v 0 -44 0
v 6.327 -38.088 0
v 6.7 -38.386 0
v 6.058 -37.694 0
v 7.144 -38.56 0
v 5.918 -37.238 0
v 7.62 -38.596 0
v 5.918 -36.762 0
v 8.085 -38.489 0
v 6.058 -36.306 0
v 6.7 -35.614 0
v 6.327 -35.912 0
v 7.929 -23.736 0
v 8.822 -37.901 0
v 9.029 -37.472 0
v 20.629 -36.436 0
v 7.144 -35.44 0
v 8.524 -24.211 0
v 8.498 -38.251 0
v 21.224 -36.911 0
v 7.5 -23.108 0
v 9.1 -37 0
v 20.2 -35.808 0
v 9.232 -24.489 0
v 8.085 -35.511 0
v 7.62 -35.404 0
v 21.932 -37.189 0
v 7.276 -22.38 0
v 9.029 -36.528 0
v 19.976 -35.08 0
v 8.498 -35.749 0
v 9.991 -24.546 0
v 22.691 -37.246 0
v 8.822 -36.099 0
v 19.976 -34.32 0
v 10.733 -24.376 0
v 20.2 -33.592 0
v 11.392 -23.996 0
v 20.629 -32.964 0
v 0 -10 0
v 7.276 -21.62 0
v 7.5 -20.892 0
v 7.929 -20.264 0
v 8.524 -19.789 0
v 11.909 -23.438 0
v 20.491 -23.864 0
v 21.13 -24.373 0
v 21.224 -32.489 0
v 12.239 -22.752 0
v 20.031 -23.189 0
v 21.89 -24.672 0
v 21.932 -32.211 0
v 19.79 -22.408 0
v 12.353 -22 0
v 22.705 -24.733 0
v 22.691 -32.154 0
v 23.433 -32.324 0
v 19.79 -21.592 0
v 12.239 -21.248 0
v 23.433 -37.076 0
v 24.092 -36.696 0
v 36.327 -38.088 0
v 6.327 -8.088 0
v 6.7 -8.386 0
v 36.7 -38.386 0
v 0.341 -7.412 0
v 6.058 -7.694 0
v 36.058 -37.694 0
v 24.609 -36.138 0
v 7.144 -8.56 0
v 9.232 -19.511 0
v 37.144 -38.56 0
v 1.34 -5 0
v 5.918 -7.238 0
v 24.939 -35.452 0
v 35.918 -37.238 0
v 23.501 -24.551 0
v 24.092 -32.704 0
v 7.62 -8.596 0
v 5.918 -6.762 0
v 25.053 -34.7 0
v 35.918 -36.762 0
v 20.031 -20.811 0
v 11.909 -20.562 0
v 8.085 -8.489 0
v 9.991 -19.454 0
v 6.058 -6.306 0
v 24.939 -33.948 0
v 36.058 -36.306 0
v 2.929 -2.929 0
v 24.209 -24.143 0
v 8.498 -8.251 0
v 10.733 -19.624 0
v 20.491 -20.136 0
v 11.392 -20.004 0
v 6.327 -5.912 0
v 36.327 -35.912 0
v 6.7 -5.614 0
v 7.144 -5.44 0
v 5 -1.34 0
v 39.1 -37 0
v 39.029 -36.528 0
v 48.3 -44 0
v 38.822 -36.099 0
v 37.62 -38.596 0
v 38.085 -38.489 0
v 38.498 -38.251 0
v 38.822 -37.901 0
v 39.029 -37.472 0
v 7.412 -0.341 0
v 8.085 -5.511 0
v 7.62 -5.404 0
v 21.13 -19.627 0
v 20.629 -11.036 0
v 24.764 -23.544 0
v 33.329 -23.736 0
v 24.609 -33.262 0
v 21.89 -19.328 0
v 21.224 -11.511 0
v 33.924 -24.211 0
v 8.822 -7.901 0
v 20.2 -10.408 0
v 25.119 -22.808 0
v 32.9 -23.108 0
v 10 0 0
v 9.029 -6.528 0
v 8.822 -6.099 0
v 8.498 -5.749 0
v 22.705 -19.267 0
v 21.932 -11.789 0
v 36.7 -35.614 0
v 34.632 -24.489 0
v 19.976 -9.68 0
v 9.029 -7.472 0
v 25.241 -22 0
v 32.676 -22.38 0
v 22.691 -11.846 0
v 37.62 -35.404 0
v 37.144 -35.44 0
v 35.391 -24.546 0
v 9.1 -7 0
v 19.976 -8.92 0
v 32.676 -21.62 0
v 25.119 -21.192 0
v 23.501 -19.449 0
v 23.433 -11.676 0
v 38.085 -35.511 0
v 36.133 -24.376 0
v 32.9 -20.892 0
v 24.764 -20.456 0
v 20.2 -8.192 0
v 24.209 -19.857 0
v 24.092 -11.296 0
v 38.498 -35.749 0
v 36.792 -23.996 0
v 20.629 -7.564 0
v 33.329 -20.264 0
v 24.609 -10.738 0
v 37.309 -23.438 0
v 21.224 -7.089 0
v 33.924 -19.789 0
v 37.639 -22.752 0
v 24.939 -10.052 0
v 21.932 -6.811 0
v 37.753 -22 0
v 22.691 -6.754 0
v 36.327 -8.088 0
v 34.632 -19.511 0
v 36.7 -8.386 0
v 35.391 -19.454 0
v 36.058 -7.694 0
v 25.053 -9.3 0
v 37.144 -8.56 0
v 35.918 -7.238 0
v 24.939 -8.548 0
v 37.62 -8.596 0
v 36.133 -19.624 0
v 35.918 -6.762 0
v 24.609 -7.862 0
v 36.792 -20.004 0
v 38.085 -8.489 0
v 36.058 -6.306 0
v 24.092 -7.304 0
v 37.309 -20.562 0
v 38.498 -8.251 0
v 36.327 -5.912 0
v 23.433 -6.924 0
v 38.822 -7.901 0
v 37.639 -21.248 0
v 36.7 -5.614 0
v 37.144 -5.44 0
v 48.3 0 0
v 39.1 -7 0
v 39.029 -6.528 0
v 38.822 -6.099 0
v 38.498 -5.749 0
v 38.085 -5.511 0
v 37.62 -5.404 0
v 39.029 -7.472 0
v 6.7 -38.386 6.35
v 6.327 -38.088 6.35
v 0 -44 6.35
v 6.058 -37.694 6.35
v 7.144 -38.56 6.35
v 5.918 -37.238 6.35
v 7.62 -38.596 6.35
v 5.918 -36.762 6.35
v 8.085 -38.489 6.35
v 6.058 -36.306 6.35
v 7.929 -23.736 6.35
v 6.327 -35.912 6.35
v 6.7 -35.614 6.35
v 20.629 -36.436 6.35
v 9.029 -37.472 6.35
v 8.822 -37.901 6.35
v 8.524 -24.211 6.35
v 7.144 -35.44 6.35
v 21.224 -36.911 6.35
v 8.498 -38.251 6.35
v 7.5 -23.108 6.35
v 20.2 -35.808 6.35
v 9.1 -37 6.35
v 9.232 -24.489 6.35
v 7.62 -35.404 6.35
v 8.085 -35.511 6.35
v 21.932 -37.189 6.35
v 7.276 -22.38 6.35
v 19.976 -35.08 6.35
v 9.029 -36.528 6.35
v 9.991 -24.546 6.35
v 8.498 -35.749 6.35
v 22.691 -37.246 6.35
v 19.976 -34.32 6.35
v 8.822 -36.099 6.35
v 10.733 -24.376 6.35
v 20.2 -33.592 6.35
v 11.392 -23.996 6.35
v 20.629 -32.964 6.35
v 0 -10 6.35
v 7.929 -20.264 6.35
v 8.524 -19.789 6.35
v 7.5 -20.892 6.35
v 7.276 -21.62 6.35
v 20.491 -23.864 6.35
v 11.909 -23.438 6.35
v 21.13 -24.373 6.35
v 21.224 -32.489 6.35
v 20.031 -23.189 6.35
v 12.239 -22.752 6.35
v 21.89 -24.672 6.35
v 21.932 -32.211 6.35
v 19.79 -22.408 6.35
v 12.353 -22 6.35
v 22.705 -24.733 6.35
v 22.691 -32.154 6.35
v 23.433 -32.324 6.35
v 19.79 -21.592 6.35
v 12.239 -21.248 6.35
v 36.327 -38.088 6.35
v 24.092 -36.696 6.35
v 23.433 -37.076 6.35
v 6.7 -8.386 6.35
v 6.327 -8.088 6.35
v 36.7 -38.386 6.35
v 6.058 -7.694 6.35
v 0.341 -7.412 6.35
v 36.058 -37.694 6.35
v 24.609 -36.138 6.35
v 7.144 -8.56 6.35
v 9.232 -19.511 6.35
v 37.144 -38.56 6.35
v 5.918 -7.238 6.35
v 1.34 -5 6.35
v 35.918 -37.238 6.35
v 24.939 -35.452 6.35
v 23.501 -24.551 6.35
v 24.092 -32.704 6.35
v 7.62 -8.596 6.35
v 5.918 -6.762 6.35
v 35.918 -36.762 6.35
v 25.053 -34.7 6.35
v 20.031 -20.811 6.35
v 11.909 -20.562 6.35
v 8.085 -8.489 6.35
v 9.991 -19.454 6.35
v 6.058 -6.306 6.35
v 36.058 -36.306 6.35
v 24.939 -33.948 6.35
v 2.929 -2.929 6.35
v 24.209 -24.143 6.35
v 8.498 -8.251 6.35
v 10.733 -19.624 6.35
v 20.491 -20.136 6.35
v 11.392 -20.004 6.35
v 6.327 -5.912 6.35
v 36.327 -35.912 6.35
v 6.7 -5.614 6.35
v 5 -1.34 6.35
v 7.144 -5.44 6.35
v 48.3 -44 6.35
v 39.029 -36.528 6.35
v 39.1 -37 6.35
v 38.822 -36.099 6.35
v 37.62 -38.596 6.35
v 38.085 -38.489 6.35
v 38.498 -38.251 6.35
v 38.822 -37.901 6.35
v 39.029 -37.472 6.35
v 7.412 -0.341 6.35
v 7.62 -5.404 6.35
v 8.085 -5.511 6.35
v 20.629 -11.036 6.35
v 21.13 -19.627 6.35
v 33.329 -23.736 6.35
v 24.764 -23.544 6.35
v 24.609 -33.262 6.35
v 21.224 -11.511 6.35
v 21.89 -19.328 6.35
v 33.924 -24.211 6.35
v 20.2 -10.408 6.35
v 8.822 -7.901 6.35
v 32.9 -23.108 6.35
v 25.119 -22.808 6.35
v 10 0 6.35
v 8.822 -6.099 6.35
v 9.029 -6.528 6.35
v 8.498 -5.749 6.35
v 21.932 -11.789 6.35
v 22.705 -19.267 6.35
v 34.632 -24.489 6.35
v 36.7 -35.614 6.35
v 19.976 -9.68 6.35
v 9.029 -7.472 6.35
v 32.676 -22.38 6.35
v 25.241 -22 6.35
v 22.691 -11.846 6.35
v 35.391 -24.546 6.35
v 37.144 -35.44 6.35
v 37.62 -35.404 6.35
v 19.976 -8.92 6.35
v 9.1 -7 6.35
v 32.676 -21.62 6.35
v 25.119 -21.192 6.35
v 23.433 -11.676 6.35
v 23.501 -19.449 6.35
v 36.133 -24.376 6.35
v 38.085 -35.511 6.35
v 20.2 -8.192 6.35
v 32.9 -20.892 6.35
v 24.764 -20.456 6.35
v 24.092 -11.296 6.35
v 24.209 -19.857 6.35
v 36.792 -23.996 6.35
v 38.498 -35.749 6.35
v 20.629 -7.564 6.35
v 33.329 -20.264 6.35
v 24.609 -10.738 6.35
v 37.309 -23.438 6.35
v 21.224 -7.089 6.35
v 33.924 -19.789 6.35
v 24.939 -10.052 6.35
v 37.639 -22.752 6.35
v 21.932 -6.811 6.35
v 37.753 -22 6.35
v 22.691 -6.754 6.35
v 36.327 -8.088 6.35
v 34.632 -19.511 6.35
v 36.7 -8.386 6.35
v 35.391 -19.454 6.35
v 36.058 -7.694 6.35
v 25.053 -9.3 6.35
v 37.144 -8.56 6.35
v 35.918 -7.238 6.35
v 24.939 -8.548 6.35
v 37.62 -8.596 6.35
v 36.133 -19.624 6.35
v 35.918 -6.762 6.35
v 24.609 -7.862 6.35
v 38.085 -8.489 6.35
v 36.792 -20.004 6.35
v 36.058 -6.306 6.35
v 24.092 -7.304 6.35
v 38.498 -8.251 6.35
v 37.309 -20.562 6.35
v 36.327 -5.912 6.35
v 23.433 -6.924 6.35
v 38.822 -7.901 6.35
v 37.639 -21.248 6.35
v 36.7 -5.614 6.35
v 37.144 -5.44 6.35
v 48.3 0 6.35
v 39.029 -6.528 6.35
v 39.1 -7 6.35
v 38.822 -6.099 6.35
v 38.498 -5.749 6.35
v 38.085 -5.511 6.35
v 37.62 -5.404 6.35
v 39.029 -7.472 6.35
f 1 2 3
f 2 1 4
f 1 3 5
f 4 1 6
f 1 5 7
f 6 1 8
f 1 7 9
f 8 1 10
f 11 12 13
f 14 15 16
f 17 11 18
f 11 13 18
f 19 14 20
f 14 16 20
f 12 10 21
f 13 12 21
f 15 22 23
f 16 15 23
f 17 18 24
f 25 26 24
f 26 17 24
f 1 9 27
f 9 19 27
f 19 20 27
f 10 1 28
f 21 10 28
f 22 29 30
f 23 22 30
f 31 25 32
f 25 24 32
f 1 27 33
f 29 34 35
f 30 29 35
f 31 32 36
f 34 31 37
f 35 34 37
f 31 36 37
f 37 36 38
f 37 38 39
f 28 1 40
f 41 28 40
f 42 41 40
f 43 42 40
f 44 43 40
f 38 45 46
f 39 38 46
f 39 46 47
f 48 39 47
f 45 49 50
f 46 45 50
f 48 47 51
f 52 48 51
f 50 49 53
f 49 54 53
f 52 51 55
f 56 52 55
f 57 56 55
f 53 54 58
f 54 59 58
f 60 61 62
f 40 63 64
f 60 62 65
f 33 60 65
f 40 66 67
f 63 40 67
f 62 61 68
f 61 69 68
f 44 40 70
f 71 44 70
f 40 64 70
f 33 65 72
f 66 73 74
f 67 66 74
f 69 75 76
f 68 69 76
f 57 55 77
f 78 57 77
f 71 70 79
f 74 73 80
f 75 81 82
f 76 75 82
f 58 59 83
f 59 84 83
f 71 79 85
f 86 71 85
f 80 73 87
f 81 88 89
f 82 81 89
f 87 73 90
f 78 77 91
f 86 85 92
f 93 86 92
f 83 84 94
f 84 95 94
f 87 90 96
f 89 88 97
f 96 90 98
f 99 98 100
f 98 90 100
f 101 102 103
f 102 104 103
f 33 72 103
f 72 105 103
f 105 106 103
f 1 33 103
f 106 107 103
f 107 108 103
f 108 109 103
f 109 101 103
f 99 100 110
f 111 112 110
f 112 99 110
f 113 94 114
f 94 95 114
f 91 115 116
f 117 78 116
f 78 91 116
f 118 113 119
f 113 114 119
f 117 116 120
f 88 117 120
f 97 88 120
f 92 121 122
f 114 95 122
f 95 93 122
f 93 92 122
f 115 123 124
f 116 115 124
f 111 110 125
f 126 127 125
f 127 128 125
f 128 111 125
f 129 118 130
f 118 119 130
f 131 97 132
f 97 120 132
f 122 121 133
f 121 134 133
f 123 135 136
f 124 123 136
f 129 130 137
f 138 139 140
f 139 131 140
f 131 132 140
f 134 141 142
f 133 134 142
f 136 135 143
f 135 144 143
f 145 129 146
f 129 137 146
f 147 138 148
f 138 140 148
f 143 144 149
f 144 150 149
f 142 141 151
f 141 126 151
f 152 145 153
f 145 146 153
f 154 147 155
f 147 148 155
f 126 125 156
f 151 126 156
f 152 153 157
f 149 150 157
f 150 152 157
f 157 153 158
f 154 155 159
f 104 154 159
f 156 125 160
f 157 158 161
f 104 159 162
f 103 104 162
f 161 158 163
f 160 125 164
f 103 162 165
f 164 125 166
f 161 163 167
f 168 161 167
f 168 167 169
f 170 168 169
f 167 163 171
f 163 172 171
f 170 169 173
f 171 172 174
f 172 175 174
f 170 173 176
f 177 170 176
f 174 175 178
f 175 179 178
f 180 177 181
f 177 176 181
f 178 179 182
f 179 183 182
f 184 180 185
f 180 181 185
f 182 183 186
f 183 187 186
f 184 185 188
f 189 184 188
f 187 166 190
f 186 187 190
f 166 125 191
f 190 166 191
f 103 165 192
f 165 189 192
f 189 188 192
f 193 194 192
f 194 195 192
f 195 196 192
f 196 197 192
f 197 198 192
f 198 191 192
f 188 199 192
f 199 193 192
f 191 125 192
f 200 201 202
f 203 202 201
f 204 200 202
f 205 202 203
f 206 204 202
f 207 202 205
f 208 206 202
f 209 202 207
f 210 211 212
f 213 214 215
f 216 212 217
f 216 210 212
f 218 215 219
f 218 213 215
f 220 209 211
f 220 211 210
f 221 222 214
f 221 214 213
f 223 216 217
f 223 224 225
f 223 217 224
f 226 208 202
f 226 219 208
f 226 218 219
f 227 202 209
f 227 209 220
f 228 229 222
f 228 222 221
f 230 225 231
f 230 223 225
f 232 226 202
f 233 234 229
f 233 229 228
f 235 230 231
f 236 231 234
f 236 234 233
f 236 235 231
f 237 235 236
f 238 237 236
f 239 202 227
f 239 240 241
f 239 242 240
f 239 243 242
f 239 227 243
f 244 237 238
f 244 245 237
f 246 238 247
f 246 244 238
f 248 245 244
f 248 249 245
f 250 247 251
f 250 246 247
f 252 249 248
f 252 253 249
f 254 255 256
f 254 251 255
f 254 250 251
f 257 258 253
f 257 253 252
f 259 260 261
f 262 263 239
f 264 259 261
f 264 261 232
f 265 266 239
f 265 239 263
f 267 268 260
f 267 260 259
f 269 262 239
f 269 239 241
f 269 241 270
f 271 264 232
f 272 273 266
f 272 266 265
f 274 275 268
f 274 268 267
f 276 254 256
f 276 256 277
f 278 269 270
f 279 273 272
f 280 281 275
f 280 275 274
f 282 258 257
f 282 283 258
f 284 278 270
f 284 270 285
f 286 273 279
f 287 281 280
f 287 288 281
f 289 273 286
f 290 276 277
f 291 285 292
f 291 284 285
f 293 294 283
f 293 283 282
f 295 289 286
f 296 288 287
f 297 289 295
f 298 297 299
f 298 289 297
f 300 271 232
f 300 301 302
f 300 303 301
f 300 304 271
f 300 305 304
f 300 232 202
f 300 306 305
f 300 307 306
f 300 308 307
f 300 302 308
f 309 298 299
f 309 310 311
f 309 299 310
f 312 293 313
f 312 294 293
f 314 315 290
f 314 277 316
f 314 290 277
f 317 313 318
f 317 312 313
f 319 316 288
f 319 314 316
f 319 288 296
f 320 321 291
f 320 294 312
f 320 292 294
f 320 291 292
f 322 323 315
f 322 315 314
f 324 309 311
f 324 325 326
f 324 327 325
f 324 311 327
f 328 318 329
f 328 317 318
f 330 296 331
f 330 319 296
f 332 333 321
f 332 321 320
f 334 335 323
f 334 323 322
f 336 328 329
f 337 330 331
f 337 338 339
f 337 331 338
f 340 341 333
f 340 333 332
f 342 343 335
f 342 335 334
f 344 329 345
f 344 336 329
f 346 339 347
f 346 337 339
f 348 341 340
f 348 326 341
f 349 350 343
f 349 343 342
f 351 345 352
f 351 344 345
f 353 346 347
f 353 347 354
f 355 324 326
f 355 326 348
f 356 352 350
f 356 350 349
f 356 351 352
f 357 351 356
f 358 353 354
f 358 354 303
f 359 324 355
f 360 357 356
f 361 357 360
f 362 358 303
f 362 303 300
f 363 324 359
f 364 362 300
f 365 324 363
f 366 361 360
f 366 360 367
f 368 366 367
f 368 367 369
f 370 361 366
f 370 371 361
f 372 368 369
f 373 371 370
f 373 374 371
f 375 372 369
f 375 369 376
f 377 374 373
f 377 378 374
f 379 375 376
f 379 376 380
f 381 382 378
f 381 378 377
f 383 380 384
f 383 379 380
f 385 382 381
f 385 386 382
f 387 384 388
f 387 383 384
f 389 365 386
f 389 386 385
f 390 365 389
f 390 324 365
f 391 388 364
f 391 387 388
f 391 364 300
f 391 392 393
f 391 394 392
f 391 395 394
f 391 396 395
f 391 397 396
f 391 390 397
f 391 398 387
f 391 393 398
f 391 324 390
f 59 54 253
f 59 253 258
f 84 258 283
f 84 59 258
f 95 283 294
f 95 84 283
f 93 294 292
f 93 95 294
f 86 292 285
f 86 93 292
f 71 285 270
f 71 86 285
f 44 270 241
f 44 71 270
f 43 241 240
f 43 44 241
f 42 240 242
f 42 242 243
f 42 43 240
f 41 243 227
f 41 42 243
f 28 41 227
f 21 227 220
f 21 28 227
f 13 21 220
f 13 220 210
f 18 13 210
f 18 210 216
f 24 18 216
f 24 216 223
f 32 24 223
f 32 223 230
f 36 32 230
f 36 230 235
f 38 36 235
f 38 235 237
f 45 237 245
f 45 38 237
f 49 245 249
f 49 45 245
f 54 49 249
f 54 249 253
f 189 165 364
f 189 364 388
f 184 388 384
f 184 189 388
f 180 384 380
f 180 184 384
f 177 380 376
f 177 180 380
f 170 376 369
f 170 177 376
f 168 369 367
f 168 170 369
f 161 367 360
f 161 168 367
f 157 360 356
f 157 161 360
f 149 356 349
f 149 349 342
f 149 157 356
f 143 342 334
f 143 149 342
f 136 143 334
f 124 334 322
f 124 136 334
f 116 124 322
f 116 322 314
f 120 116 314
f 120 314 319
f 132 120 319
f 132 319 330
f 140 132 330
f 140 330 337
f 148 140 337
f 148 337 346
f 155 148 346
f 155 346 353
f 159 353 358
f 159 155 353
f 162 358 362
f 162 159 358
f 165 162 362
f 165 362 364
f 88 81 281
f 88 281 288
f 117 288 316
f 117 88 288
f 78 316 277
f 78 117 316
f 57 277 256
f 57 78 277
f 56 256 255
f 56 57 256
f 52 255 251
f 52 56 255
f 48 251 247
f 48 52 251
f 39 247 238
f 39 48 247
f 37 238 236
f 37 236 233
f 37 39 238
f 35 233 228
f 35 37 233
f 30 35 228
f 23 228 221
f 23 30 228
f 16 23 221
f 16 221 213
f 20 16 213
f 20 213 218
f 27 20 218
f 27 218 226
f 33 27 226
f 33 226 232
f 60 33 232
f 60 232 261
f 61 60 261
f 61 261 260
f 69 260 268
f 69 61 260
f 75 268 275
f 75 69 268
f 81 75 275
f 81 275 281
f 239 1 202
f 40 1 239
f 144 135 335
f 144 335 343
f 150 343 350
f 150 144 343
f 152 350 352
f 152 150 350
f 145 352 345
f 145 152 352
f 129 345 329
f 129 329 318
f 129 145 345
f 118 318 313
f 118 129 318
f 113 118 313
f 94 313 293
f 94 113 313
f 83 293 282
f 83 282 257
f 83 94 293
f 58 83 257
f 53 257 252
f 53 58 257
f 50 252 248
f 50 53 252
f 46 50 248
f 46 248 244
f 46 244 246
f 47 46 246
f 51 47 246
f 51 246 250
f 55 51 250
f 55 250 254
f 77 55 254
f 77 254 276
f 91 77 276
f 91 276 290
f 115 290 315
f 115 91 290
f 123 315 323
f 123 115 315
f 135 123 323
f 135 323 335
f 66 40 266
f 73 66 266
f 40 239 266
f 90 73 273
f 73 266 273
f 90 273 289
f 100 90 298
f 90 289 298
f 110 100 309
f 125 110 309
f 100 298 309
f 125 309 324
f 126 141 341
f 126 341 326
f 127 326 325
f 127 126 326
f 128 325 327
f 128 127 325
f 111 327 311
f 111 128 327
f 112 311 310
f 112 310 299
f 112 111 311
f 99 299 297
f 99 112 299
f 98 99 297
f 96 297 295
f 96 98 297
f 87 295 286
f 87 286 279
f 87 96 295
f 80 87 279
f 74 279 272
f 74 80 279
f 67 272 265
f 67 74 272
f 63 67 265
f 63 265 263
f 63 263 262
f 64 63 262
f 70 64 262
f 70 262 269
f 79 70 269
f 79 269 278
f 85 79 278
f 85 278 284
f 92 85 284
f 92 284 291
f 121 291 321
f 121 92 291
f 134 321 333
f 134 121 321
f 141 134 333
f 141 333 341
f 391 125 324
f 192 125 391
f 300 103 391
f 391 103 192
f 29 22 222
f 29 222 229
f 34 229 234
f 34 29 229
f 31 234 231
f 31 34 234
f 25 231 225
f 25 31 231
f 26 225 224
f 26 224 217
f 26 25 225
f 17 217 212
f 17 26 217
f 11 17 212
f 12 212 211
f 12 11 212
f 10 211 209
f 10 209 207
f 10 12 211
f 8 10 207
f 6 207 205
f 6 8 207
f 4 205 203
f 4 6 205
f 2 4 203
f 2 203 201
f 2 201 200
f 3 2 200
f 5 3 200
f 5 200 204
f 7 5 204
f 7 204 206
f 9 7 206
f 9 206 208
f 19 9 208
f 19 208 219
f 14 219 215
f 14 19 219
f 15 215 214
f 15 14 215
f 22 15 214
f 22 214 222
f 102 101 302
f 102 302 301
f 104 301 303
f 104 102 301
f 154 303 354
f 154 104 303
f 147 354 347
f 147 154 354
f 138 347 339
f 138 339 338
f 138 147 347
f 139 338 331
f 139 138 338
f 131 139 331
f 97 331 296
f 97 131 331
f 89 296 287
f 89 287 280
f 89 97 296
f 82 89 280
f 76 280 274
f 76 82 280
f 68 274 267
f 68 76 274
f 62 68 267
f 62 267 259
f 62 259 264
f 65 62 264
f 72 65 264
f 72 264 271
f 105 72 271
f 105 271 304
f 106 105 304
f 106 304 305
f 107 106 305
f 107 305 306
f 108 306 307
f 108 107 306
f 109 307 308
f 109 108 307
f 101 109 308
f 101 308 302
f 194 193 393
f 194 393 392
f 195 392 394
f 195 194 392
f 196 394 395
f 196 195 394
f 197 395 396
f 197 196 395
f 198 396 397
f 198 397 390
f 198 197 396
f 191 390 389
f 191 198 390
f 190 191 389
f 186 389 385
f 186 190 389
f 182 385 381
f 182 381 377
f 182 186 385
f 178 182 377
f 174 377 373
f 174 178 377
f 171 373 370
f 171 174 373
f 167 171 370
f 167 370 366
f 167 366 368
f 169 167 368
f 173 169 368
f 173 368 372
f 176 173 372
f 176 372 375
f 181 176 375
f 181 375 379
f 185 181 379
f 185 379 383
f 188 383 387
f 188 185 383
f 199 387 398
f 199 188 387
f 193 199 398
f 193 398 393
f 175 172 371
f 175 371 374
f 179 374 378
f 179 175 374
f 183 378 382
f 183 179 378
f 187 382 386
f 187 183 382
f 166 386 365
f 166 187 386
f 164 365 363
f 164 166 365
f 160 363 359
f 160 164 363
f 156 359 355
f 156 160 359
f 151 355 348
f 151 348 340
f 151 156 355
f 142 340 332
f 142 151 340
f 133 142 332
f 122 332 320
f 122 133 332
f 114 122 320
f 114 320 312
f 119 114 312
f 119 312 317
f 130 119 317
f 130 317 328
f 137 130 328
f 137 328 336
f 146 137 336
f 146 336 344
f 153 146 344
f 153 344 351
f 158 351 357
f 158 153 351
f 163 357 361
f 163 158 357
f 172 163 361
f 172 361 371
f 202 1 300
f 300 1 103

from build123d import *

# Parameters (mm, degrees)
SKETCH1_W               = 48.3
SKETCH1_H               = 44
SKETCH1_R               = 1.6
SKETCH1_R_2             = 2.5527
SKETCH1_R_3             = 2.740604045
BOSS_EXTRUDE1_DEPTH     = 6.35
F_1_4_20_TAPPED_HOLE1_D = 5.1054
FILLET1_R               = 10


with BuildPart() as part:
    # Sketch1 → Boss-Extrude1 (new body)
    with BuildSketch(Plane.XY):
        with Locations((24.15, -22)):
            Rectangle(SKETCH1_W, SKETCH1_H)
        with Locations((7.5, -37)):
            Circle(SKETCH1_R, mode=Mode.SUBTRACT)
        with Locations((22.5, -9.3)):
            Circle(SKETCH1_R_2, mode=Mode.SUBTRACT)
        with Locations((35.2, -22)):
            Circle(SKETCH1_R_2, mode=Mode.SUBTRACT)
        with Locations((9.8, -22)):
            Circle(SKETCH1_R_2, mode=Mode.SUBTRACT)
        with Locations((22.5, -34.7)):
            Circle(SKETCH1_R_2, mode=Mode.SUBTRACT)
        with Locations((37.5, -37)):
            Circle(SKETCH1_R, mode=Mode.SUBTRACT)
        with Locations((37.5, -7)):
            Circle(SKETCH1_R, mode=Mode.SUBTRACT)
        with Locations((7.5, -7)):
            Circle(SKETCH1_R, mode=Mode.SUBTRACT)
        with Locations((22.5, -22)):
            Circle(SKETCH1_R_3, mode=Mode.SUBTRACT)
    extrude(amount=BOSS_EXTRUDE1_DEPTH)

    # 1/4-20 Tapped Hole1 (through all)
    with Locations(Plane(origin=(22.5, -9.3, 6.35), x_dir=(1, 0, 0), z_dir=(0, 0, 1))):
        with Locations((0, 0), (12.7, -12.7), (-12.7, -12.7), (0, -25.4)):
            Hole(F_1_4_20_TAPPED_HOLE1_D / 2)

    # Fillet1
    fillet1_edges = [part.edges().sort_by_distance(p)[0] for p in [
        (0, 0, 3.175),
    ]]
    fillet(fillet1_edges, radius=FILLET1_R)


solid = part.part
